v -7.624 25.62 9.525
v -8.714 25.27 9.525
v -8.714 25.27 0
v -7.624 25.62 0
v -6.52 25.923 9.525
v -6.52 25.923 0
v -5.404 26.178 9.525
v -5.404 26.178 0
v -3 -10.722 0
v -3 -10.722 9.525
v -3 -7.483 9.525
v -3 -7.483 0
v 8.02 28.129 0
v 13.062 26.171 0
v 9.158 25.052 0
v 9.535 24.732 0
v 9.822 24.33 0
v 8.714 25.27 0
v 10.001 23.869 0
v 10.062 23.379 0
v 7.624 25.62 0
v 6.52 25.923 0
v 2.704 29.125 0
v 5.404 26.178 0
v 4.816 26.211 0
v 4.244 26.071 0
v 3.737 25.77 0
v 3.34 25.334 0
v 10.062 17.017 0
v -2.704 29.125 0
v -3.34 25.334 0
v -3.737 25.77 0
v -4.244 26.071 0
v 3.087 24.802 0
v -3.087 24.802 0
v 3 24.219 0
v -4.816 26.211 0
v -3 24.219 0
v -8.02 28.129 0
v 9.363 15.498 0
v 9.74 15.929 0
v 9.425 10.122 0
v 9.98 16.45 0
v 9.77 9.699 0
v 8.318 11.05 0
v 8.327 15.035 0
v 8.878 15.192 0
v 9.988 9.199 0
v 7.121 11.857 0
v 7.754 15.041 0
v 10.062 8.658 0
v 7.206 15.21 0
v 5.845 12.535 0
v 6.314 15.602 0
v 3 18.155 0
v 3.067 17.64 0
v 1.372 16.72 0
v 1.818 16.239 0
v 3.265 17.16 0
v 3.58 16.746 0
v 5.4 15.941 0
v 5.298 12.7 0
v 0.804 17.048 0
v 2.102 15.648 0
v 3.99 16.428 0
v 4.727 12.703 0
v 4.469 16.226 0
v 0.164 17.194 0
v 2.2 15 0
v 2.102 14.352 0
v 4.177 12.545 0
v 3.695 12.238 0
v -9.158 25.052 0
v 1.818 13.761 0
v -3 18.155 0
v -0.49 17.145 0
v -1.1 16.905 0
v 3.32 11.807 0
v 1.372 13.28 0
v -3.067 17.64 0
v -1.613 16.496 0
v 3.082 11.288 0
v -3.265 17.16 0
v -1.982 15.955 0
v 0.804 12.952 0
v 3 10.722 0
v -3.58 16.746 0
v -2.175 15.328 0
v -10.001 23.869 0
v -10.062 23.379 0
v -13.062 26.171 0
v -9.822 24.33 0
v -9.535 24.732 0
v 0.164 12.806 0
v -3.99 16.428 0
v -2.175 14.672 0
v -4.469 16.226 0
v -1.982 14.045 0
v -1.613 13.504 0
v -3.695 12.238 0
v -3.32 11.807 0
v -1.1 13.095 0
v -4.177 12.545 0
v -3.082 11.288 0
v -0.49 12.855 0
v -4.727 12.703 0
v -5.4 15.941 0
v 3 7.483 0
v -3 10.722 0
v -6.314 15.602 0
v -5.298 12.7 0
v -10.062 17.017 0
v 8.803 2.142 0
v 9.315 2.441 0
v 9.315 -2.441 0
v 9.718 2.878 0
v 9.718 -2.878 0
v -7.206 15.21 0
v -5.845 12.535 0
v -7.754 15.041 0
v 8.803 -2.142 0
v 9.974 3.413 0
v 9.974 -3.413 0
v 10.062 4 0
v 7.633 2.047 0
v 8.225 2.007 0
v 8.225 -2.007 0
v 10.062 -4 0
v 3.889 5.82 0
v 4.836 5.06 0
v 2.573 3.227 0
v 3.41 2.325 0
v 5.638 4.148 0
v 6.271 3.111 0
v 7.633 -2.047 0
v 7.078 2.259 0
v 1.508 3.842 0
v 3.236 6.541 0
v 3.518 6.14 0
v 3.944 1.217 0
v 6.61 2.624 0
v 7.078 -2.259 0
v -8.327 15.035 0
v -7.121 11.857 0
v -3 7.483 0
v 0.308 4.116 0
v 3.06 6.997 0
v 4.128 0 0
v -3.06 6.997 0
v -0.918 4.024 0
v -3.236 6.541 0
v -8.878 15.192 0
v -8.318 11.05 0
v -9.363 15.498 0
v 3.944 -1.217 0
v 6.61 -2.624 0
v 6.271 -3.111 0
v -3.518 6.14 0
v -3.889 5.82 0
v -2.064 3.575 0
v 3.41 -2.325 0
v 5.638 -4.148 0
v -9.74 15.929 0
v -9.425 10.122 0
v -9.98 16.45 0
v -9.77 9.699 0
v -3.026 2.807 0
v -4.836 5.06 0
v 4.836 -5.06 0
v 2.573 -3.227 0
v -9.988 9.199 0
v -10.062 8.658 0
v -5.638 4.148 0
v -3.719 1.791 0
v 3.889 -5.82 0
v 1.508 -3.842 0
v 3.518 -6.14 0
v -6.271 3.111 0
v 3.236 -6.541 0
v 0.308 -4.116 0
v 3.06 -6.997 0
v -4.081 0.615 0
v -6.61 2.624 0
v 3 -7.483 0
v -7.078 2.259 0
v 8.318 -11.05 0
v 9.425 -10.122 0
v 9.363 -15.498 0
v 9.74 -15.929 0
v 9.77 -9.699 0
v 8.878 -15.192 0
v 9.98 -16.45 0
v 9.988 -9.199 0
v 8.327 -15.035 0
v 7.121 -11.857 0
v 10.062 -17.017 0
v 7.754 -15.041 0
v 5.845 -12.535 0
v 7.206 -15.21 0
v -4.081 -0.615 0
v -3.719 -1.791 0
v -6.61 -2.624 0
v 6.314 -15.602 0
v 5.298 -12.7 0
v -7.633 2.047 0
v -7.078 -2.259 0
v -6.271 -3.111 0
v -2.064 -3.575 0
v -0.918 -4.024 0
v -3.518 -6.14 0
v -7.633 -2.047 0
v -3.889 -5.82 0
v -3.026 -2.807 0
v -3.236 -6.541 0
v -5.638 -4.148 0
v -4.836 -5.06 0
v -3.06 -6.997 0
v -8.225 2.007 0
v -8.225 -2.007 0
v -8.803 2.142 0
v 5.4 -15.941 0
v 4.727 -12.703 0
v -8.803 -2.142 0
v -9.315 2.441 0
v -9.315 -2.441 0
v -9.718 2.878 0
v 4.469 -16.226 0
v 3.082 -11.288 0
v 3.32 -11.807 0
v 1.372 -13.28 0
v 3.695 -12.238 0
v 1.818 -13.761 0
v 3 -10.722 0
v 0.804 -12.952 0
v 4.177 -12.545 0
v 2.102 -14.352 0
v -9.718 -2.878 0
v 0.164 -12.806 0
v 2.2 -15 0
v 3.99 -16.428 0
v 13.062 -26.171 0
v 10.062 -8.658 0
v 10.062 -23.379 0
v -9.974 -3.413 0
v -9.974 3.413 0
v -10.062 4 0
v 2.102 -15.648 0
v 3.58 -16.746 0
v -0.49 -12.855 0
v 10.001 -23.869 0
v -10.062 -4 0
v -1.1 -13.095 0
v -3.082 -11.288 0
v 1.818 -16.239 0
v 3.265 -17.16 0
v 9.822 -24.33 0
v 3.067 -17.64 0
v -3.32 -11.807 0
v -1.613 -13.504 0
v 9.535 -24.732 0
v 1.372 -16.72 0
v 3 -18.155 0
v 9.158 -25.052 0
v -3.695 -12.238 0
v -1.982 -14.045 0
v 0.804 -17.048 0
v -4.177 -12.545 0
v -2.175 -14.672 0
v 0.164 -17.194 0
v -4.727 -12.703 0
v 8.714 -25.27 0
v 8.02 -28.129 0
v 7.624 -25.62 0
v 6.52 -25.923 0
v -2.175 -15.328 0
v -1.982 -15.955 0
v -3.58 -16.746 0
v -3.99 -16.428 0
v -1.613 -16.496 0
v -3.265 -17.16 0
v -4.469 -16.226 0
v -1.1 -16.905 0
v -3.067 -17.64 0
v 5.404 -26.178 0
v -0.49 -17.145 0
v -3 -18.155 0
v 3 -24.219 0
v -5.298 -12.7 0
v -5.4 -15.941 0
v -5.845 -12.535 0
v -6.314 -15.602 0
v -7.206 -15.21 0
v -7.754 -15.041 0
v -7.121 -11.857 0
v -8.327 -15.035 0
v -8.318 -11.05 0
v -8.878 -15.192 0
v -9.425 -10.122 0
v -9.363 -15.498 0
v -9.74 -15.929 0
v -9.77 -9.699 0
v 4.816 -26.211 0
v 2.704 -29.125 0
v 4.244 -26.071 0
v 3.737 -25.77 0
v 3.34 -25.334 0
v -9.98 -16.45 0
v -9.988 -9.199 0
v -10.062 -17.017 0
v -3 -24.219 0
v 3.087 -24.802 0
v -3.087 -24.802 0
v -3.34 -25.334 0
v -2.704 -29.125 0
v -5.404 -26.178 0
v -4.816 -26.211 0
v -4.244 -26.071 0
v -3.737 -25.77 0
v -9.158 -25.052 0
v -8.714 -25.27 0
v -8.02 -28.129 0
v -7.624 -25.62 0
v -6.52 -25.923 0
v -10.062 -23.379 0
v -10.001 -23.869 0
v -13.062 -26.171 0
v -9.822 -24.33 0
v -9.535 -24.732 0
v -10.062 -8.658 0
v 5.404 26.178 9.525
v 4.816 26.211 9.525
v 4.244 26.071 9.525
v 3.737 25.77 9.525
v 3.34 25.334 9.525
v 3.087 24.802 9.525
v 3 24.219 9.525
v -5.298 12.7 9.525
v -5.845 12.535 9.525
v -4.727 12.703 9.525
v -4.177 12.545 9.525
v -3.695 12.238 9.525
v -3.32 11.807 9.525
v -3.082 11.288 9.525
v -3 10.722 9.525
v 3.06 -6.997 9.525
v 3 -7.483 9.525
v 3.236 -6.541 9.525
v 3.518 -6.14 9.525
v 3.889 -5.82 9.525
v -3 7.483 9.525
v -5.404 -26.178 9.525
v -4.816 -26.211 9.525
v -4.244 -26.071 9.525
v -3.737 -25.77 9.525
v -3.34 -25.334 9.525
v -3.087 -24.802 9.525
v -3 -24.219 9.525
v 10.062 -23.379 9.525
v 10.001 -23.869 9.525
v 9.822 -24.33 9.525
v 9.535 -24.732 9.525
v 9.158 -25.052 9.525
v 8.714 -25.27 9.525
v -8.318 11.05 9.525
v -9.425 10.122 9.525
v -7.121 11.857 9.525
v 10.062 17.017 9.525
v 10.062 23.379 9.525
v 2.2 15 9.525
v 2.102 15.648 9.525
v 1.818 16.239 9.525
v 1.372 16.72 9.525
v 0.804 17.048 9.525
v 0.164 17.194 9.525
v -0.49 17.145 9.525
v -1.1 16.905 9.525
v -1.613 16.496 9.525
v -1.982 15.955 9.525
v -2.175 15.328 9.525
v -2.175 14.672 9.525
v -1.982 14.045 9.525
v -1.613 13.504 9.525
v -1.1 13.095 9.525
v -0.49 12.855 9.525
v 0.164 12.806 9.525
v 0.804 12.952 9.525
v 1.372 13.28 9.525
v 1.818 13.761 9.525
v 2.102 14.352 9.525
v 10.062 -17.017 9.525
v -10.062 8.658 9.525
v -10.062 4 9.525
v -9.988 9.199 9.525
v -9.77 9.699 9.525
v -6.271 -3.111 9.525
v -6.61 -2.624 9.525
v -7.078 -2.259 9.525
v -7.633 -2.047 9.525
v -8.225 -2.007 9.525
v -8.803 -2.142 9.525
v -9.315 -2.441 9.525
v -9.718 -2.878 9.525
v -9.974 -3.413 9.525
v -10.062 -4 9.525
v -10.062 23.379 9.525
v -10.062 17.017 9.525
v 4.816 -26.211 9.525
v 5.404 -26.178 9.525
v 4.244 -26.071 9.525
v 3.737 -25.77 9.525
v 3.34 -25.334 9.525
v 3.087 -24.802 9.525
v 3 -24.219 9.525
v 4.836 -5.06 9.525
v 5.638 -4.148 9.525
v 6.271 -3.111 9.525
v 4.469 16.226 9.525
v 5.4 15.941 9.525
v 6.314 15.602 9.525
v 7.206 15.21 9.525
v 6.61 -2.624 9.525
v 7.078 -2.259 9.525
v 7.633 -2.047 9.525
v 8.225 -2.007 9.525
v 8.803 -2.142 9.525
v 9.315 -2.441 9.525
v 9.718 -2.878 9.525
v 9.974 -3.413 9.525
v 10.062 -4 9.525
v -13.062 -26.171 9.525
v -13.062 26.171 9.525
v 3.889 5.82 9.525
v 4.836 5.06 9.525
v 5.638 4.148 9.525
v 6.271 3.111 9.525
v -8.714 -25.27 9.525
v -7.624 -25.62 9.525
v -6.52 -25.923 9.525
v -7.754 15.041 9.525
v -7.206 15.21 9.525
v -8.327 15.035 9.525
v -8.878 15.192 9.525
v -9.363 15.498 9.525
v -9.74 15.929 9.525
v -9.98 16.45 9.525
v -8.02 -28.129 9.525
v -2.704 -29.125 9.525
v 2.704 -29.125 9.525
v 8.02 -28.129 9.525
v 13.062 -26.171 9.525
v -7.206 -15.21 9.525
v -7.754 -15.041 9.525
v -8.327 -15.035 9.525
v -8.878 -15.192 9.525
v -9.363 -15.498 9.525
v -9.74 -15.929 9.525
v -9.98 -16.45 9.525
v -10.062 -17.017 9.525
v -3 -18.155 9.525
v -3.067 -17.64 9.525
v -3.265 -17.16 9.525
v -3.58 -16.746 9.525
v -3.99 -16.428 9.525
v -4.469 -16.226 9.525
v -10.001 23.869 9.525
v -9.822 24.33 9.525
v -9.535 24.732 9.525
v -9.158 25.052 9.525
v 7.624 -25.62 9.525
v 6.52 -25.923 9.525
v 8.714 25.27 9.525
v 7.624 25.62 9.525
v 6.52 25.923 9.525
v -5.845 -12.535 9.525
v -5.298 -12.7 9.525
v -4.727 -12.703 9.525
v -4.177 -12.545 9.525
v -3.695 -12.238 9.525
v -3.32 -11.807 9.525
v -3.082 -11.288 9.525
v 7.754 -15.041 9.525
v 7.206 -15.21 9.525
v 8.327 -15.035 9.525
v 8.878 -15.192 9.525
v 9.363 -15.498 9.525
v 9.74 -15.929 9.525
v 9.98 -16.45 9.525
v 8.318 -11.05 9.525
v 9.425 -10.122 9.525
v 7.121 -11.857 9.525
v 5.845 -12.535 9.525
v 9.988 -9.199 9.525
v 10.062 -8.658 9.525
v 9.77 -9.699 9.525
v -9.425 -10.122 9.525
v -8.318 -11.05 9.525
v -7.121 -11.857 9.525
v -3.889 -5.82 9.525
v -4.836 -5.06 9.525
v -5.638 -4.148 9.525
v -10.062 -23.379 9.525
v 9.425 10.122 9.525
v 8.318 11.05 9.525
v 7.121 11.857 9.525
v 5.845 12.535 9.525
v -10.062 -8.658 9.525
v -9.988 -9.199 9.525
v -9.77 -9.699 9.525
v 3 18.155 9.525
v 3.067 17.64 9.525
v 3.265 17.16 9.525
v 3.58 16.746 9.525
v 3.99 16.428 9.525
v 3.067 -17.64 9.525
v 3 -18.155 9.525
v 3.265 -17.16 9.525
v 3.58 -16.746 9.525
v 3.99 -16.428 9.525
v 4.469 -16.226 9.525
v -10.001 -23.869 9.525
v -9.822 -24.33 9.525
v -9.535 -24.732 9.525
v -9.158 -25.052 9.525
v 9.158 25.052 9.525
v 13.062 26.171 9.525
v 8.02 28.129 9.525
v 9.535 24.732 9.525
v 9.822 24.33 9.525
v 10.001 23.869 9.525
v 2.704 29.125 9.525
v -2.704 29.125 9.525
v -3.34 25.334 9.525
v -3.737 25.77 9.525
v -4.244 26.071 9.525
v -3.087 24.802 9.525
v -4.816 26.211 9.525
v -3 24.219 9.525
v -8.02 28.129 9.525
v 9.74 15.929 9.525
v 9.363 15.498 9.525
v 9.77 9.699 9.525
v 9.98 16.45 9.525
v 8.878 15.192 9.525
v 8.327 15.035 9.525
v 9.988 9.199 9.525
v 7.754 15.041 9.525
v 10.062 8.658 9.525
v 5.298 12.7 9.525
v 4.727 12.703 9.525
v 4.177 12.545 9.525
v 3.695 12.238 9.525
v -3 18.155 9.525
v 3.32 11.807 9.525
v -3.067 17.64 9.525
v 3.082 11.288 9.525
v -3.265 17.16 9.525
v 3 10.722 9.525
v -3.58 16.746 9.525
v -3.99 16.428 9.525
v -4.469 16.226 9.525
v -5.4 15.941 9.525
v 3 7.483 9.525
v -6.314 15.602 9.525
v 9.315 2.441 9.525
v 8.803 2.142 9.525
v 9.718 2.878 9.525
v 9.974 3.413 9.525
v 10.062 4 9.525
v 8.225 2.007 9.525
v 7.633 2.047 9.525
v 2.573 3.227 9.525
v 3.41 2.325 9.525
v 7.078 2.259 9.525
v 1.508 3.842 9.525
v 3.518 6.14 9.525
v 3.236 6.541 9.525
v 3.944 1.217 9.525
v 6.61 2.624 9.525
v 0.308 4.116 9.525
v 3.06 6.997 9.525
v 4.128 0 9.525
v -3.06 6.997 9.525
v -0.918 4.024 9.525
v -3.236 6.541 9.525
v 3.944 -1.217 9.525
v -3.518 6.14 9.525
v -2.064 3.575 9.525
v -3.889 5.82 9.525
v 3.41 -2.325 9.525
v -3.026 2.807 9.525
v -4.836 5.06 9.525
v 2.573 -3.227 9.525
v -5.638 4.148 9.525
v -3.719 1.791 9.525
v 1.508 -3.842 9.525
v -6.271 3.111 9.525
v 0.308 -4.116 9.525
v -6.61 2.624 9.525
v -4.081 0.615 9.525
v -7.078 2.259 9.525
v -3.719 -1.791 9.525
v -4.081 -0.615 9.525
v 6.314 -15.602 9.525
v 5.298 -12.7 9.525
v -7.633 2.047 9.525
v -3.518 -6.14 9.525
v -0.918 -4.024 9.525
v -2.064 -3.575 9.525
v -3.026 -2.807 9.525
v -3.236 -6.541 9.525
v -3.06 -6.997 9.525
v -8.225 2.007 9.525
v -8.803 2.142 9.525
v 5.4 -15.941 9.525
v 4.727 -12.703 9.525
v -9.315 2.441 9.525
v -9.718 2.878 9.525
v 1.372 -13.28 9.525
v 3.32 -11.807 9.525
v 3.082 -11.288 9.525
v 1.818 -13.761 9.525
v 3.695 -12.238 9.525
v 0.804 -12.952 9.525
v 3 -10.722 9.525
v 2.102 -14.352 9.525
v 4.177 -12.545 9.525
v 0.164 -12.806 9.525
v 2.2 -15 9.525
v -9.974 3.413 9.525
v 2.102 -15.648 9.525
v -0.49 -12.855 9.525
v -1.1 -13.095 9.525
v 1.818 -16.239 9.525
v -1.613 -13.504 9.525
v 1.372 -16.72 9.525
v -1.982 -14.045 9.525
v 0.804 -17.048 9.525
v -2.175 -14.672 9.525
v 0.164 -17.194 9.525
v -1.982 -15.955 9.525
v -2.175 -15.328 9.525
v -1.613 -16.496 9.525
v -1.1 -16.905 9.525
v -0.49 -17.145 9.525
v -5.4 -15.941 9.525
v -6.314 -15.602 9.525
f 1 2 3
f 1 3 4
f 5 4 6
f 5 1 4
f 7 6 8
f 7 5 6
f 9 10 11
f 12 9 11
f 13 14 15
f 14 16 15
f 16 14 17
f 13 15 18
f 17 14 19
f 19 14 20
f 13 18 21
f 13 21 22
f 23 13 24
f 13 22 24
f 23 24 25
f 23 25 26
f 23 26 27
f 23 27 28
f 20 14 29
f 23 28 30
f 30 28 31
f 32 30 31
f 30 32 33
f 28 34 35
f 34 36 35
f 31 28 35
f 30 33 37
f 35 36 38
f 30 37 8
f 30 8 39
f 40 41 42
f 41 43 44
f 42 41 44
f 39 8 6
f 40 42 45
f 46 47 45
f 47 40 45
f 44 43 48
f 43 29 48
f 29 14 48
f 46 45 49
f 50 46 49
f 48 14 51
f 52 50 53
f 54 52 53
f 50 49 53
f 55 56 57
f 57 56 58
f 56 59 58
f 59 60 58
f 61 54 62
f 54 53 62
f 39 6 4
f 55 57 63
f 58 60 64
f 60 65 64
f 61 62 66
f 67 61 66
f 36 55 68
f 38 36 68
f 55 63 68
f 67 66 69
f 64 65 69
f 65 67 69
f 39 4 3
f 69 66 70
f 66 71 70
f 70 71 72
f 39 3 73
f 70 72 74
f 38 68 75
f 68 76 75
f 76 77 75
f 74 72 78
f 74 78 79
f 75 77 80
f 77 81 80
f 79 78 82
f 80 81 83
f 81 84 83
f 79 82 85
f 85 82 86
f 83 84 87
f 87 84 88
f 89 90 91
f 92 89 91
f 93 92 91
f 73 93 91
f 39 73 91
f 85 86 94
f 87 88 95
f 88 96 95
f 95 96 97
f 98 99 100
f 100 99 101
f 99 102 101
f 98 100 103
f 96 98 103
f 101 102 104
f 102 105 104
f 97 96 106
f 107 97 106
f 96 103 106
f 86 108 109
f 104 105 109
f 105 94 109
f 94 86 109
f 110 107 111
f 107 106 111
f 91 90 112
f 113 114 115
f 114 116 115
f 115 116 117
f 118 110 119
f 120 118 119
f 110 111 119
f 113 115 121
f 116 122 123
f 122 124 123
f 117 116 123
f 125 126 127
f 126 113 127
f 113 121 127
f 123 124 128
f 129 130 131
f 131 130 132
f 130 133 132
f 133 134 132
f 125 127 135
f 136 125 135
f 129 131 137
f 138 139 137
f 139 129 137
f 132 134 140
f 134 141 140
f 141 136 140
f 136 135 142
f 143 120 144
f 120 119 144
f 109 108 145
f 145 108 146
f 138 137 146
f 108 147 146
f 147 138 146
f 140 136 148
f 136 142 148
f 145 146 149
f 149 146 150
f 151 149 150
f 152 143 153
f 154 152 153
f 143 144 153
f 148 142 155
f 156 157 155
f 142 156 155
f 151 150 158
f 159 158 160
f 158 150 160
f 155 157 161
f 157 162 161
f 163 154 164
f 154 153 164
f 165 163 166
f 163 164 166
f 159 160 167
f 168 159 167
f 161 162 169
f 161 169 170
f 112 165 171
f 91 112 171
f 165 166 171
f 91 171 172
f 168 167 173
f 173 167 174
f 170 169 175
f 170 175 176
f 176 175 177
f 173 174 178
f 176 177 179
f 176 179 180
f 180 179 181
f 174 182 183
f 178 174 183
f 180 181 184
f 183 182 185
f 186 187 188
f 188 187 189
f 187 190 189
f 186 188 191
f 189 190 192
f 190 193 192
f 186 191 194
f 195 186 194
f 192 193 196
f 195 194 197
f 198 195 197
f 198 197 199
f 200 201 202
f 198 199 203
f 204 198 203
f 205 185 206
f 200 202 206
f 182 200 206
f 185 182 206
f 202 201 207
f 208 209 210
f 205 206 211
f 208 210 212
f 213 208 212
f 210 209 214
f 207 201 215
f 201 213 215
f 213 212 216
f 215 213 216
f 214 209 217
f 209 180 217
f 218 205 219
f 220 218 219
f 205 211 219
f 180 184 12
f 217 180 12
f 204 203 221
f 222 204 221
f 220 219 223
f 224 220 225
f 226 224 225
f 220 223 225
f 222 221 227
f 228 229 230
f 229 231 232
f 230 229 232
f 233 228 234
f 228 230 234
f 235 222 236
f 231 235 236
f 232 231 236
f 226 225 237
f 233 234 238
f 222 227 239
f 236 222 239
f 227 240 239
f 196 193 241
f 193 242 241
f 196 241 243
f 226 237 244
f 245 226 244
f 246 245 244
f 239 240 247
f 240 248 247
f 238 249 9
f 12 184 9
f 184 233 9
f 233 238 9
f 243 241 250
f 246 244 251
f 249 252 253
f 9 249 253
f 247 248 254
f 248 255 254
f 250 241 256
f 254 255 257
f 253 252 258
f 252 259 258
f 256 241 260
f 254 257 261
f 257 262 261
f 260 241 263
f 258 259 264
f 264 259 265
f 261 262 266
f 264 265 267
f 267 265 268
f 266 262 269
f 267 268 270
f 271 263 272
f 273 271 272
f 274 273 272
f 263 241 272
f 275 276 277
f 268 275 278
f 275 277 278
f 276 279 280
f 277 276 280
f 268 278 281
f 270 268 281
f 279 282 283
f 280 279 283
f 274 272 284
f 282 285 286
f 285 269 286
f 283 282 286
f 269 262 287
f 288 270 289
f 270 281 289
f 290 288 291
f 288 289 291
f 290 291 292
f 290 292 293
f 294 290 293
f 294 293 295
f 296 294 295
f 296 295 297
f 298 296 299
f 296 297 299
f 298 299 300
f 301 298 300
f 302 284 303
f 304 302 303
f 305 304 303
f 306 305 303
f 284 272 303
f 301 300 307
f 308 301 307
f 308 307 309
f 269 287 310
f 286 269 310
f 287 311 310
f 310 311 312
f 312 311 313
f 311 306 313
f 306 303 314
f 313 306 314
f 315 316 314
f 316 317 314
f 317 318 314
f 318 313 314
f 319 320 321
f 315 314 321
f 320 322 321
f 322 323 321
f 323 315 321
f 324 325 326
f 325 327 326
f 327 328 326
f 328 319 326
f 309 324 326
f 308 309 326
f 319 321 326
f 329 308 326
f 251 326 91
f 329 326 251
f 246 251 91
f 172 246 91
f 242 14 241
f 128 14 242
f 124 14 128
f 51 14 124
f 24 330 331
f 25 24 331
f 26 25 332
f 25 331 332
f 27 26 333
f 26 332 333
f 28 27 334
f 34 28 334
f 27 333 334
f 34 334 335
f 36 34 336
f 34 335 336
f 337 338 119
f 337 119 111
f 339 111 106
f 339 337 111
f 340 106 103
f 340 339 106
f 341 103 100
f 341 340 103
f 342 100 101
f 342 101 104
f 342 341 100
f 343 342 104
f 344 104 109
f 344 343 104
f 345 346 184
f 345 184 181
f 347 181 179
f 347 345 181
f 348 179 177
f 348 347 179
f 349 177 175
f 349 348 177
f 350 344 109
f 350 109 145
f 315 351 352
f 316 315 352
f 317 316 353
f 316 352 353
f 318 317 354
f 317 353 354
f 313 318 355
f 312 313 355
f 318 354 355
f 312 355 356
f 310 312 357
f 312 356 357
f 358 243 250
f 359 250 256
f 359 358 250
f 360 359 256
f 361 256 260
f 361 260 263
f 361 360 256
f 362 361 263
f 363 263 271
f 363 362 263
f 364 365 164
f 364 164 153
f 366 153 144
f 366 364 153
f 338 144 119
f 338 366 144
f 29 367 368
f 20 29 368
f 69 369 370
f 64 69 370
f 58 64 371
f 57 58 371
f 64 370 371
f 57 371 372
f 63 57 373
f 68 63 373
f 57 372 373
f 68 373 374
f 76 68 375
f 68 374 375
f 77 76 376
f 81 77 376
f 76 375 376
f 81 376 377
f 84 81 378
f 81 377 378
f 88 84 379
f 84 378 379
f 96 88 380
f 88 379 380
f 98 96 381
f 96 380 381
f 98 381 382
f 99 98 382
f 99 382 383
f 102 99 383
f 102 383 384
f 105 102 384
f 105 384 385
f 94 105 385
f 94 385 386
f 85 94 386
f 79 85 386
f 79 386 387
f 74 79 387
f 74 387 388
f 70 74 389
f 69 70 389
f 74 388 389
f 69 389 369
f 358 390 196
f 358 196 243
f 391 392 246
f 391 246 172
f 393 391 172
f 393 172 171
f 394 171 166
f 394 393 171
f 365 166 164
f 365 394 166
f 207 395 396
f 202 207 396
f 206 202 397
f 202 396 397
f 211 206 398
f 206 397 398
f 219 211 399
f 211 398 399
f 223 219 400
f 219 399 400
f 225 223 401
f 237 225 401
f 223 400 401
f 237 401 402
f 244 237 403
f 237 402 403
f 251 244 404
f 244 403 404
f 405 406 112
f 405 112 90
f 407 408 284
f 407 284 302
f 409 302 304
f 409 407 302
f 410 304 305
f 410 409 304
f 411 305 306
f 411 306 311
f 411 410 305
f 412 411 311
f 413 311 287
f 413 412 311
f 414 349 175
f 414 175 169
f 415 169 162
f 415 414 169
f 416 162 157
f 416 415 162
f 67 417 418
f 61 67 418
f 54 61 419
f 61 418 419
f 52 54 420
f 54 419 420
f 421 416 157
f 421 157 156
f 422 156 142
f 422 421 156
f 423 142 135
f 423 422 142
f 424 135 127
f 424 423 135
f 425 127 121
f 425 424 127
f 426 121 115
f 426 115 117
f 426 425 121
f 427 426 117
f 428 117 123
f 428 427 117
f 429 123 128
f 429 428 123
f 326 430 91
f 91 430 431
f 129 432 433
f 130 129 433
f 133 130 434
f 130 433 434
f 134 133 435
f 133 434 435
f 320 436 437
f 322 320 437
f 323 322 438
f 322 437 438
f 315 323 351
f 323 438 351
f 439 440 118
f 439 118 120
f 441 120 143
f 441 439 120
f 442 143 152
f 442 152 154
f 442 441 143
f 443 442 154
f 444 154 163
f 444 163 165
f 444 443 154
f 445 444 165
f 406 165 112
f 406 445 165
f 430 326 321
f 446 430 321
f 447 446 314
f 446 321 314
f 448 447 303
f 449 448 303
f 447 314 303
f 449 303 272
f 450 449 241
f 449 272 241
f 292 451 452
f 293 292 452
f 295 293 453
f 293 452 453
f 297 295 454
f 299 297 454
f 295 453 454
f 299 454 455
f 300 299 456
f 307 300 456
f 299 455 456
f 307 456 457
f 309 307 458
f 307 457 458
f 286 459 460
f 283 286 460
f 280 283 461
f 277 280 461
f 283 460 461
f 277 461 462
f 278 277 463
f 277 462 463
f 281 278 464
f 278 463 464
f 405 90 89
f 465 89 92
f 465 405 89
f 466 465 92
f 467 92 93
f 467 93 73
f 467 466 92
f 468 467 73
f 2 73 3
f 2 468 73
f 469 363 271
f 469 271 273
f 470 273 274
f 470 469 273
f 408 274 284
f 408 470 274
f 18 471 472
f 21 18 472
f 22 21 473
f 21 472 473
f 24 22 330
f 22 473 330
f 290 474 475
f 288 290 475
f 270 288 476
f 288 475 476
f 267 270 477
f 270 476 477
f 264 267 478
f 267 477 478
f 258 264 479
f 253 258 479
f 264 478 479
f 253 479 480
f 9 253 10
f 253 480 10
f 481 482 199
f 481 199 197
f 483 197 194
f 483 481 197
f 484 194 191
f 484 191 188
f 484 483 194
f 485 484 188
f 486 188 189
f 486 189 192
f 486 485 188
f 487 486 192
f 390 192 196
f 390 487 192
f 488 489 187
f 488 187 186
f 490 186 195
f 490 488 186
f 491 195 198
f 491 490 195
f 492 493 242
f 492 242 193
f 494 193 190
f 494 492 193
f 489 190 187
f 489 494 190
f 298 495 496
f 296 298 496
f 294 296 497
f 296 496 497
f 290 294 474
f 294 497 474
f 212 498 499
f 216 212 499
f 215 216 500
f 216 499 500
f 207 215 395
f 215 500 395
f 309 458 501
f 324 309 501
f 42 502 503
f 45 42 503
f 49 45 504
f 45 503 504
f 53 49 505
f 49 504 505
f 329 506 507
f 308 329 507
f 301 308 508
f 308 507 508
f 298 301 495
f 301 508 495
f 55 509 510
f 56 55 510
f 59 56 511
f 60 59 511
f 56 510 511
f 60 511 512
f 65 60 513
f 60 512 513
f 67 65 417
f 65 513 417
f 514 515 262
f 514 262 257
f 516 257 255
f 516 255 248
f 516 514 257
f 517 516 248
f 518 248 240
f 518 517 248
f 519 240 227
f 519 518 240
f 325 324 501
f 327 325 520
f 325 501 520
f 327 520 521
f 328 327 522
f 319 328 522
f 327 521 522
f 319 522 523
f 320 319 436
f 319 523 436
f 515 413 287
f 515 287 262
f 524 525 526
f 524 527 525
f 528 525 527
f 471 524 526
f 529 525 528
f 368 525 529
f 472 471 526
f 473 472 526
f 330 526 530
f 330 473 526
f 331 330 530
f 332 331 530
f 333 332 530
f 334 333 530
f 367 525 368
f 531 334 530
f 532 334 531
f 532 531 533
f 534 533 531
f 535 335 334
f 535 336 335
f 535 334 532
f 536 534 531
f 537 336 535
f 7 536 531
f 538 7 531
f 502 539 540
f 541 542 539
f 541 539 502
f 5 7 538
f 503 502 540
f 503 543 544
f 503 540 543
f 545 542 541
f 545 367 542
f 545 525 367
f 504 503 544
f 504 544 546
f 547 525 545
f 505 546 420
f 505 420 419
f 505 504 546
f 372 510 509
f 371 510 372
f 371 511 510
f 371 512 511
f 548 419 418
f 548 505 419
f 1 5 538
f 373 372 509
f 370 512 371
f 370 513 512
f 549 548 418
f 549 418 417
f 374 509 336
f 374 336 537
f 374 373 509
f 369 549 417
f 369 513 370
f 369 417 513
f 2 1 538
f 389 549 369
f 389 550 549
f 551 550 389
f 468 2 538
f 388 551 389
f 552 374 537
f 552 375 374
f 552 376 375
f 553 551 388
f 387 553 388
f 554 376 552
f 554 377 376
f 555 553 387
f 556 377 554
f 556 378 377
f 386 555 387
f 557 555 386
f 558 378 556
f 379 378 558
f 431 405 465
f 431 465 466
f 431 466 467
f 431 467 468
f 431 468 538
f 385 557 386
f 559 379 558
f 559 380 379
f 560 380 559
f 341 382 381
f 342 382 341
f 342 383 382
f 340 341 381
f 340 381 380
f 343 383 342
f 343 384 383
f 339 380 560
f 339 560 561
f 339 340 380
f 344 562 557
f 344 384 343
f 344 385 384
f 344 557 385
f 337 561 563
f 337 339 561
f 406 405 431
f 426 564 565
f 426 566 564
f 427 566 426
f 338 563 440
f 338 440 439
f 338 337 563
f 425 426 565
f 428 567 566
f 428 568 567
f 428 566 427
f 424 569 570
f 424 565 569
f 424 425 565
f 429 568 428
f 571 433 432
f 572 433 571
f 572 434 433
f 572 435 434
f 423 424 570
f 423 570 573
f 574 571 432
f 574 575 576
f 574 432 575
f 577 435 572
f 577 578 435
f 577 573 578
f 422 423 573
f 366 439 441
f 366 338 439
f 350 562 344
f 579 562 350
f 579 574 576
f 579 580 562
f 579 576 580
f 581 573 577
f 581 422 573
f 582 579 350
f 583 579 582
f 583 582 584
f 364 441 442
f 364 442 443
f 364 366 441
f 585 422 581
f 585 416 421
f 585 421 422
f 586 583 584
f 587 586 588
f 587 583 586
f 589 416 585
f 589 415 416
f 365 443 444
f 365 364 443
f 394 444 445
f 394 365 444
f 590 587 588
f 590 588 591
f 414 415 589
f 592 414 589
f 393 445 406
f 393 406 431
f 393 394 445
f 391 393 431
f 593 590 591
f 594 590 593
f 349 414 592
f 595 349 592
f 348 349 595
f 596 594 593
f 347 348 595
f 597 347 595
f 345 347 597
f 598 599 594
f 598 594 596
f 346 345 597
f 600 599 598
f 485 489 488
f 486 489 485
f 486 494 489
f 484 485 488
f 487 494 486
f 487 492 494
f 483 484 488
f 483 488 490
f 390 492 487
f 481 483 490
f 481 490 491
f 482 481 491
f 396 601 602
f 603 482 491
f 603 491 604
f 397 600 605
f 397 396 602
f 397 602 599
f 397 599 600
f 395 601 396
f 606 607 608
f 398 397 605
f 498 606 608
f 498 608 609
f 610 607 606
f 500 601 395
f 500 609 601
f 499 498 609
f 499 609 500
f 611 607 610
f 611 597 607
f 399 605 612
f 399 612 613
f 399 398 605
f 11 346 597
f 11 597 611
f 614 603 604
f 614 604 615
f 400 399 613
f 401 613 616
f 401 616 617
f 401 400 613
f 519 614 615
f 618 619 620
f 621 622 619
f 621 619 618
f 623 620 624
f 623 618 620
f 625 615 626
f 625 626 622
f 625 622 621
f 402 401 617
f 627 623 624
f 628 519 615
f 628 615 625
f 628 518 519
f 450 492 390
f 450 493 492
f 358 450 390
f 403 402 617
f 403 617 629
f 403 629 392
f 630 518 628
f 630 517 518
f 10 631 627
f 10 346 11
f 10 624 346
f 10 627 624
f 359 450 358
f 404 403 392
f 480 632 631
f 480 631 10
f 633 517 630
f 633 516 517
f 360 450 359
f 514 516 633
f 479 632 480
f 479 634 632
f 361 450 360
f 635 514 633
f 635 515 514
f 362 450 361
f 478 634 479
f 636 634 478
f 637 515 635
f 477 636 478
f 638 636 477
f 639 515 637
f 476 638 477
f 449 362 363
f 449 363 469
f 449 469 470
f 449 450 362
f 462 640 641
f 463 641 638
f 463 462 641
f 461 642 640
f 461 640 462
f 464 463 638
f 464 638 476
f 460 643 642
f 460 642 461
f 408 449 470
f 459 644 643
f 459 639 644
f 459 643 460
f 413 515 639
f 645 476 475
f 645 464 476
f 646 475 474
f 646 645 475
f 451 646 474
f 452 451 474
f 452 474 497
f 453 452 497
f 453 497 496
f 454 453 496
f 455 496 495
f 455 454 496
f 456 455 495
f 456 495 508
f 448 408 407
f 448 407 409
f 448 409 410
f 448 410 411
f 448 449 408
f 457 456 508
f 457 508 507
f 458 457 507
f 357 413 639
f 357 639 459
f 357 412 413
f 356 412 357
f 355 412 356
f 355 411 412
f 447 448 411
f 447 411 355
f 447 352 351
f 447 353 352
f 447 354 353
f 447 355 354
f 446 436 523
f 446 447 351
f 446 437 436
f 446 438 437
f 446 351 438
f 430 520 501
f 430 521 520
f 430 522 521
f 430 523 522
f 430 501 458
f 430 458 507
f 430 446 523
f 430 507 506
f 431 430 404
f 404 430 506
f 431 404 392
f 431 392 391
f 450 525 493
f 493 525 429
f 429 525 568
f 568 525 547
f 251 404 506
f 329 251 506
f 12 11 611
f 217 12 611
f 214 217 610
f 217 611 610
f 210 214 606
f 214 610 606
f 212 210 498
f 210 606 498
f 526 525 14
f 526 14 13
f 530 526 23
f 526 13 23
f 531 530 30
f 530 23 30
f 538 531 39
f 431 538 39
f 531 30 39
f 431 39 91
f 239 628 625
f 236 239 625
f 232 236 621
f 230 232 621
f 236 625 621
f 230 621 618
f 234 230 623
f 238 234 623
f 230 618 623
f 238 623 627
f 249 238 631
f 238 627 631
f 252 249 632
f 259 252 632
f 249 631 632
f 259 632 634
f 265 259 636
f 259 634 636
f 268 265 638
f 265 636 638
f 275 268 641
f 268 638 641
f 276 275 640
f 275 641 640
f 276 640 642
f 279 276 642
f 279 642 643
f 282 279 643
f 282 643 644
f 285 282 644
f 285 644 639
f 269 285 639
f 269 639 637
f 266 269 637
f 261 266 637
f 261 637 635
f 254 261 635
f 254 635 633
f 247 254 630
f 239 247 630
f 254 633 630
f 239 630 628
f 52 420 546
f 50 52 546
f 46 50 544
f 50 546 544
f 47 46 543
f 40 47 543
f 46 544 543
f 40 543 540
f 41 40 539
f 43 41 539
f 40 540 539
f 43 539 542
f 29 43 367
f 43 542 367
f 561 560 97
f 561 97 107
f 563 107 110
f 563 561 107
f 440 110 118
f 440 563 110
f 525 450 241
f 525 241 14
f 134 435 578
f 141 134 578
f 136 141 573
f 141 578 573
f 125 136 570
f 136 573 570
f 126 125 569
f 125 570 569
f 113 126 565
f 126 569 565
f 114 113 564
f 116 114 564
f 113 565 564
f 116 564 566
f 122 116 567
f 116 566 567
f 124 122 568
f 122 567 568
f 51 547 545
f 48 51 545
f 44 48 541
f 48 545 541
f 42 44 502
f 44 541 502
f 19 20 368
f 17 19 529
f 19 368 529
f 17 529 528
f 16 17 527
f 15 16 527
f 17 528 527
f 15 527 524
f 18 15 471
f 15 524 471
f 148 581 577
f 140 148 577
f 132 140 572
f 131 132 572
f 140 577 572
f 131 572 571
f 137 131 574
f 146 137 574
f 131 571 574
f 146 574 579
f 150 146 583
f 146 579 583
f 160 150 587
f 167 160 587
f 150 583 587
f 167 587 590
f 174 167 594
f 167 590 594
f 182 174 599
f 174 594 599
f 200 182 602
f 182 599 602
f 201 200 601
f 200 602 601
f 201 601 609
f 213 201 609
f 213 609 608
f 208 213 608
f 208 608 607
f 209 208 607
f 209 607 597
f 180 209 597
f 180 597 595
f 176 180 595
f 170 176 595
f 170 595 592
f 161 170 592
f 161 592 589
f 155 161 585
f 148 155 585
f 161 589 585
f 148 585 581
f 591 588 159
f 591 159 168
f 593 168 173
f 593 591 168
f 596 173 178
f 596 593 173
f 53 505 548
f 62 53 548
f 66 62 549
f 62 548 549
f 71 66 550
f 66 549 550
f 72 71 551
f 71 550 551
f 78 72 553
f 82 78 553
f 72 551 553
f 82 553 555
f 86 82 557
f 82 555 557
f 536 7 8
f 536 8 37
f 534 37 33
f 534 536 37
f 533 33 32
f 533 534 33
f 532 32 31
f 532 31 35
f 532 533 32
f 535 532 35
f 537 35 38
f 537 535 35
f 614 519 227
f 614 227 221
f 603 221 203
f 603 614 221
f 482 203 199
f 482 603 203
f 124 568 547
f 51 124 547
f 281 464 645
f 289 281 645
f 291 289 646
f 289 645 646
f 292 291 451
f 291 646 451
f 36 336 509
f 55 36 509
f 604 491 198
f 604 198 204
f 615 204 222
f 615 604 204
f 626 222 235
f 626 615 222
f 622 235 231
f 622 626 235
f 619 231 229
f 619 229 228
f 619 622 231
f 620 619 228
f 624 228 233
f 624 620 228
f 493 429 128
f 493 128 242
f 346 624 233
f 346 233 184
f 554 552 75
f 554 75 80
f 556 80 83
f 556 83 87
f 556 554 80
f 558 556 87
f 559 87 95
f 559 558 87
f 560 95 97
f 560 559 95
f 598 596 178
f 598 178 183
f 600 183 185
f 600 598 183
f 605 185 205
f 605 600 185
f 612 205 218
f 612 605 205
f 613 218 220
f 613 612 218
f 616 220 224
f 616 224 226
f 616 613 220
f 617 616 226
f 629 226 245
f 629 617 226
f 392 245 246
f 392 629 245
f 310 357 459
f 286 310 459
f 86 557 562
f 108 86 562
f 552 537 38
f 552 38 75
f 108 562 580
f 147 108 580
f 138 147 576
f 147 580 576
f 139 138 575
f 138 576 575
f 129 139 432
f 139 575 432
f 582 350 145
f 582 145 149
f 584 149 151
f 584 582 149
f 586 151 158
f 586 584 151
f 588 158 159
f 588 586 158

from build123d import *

# Parameters (mm, degrees)
SKETCH1_R            = 29.25
EXTRUDE_3_8_DEPTH    = 9.525
CUT_EXTRUDE1_DEPTH   = 9.525
SKETCH3_R            = 2.2
M4_THROUGH_DEPTH     = 9.525
SKETCH4_R            = 4.1275
F_3_8_16_DRILL_DEPTH = 9.525
SKETCH6_W            = 18.02935576
SKETCH6_H            = 57.579918791
CUT_EXTRUDE2_DEPTH   = 9.525


with BuildPart() as part:
    # Sketch1 → 3/8 (new body)
    with BuildSketch(Plane.XY):
        with Locations(Location((0, 0, 0), (0, 0, 180))):
            Circle(SKETCH1_R)
    extrude(amount=EXTRUDE_3_8_DEPTH)

    # Sketch2 → Cut-Extrude1 (cut)
    with BuildSketch(Plane.XY.offset(9.525)):
        with BuildLine():
            Line((-3, 24.219267124), (-3, 18.154700472))
            ThreePointArc((-3, 18.154700472), (-3.409072822, 16.942697702), (-4.468950714, 16.226492325))
            ThreePointArc((-4.468950714, 16.226492325), (-5.859541661, 15.777716729), (-7.205966503, 15.210017108))
            ThreePointArc((-7.205966503, 15.210017108), (-9.131700947, 15.327380042), (-10.062257748, 17.017436623))
            Line((-10.062257748, 17.017436623), (-10.062257748, 23.378898605))
            ThreePointArc((-10.062257748, 23.378898605), (-9.690760884, 24.539922954), (-8.714280211, 25.269630397))
            ThreePointArc((-8.714280211, 25.269630397), (-7.073918129, 25.776977757), (-5.404367165, 26.177962402))
            ThreePointArc((-5.404367165, 26.177962402), (-3.736816389, 25.769869318), (-3, 24.219267124))
        make_face()
        with BuildLine():
            Line((-3, 10.72213294), (-3, 7.483314774))
            ThreePointArc((-3, 7.483314774), (-3.236165793, 6.540505732), (-3.888888889, 5.820355935))
            ThreePointArc((-3.888888889, 5.820355935), (-5.257283867, 4.621792546), (-6.270644915, 3.111111111))
            ThreePointArc((-6.270644915, 3.111111111), (-8.518752181, 2.052793582), (-10.062257748, 4))
            Line((-10.062257748, 4), (-10.062257748, 8.658183111))
            ThreePointArc((-10.062257748, 8.658183111), (-9.896091132, 9.45634044), (-9.425202627, 10.121870666))
            ThreePointArc((-9.425202627, 10.121870666), (-7.729958395, 11.468847089), (-5.845262531, 12.534736386))
            ThreePointArc((-5.845262531, 12.534736386), (-3.925412885, 12.408923541), (-3, 10.72213294))
        make_face()
        with BuildLine():
            Line((3, 10.72213294), (3, 7.483314774))
            ThreePointArc((3, 7.483314774), (3.236165793, 6.540505732), (3.888888889, 5.820355935))
            ThreePointArc((3.888888889, 5.820355935), (5.257283867, 4.621792546), (6.270644915, 3.111111111))
            ThreePointArc((6.270644915, 3.111111111), (8.518752181, 2.052793582), (10.062257748, 4))
            Line((10.062257748, 4), (10.062257748, 8.658183111))
            ThreePointArc((10.062257748, 8.658183111), (9.896091132, 9.45634044), (9.425202627, 10.121870666))
            ThreePointArc((9.425202627, 10.121870666), (7.729958395, 11.468847089), (5.845262531, 12.534736386))
            ThreePointArc((5.845262531, 12.534736386), (3.925412885, 12.408923541), (3, 10.72213294))
        make_face()
        with BuildLine():
            Line((3, 24.219267124), (3, 18.154700472))
            ThreePointArc((3, 18.154700472), (3.409072822, 16.942697702), (4.468950714, 16.226492325))
            ThreePointArc((4.468950714, 16.226492325), (5.859541661, 15.777716729), (7.205966503, 15.210017108))
            ThreePointArc((7.205966503, 15.210017108), (9.131700947, 15.327380042), (10.062257748, 17.017436623))
            Line((10.062257748, 17.017436623), (10.062257748, 23.378898605))
            ThreePointArc((10.062257748, 23.378898605), (9.690760884, 24.539922954), (8.714280211, 25.269630397))
            ThreePointArc((8.714280211, 25.269630397), (7.073918129, 25.776977757), (5.404367165, 26.177962402))
            ThreePointArc((5.404367165, 26.177962402), (3.736816389, 25.769869318), (3, 24.219267124))
        make_face()
        with BuildLine():
            Line((-3, -10.72213294), (-3, -7.483314774))
            ThreePointArc((-3, -7.483314774), (-3.236165793, -6.540505732), (-3.888888889, -5.820355935))
            ThreePointArc((-3.888888889, -5.820355935), (-5.257283867, -4.621792546), (-6.270644915, -3.111111111))
            ThreePointArc((-6.270644915, -3.111111111), (-8.518752181, -2.052793582), (-10.062257748, -4))
            Line((-10.062257748, -4), (-10.062257748, -8.658183111))
            ThreePointArc((-10.062257748, -8.658183111), (-9.896091132, -9.45634044), (-9.425202627, -10.121870666))
            ThreePointArc((-9.425202627, -10.121870666), (-7.729958395, -11.468847089), (-5.845262531, -12.534736386))
            ThreePointArc((-5.845262531, -12.534736386), (-3.925412885, -12.408923541), (-3, -10.72213294))
        make_face()
        with BuildLine():
            Line((3, -10.72213294), (3, -7.483314774))
            ThreePointArc((3, -7.483314774), (3.236165793, -6.540505732), (3.888888889, -5.820355935))
            ThreePointArc((3.888888889, -5.820355935), (5.257283867, -4.621792546), (6.270644915, -3.111111111))
            ThreePointArc((6.270644915, -3.111111111), (8.518752181, -2.052793582), (10.062257748, -4))
            Line((10.062257748, -4), (10.062257748, -8.658183111))
            ThreePointArc((10.062257748, -8.658183111), (9.896091132, -9.45634044), (9.425202627, -10.121870666))
            ThreePointArc((9.425202627, -10.121870666), (7.729958395, -11.468847089), (5.845262531, -12.534736386))
            ThreePointArc((5.845262531, -12.534736386), (3.925412885, -12.408923541), (3, -10.72213294))
        make_face()
        with BuildLine():
            Line((3, -24.219267124), (3, -18.154700472))
            ThreePointArc((3, -18.154700472), (3.409072822, -16.942697702), (4.468950714, -16.226492325))
            ThreePointArc((4.468950714, -16.226492325), (5.859541661, -15.777716729), (7.205966503, -15.210017108))
            ThreePointArc((7.205966503, -15.210017108), (9.131700947, -15.327380042), (10.062257748, -17.017436623))
            Line((10.062257748, -17.017436623), (10.062257748, -23.378898605))
            ThreePointArc((10.062257748, -23.378898605), (9.690760884, -24.539922954), (8.714280211, -25.269630397))
            ThreePointArc((8.714280211, -25.269630397), (7.073918129, -25.776977757), (5.404367165, -26.177962402))
            ThreePointArc((5.404367165, -26.177962402), (3.736816389, -25.769869318), (3, -24.219267124))
        make_face()
        with BuildLine():
            Line((-3, -24.219267124), (-3, -18.154700472))
            ThreePointArc((-3, -18.154700472), (-3.409072822, -16.942697702), (-4.468950714, -16.226492325))
            ThreePointArc((-4.468950714, -16.226492325), (-5.859541661, -15.777716729), (-7.205966503, -15.210017108))
            ThreePointArc((-7.205966503, -15.210017108), (-9.131700947, -15.327380042), (-10.062257748, -17.017436623))
            Line((-10.062257748, -17.017436623), (-10.062257748, -23.378898605))
            ThreePointArc((-10.062257748, -23.378898605), (-9.690760884, -24.539922954), (-8.714280211, -25.269630397))
            ThreePointArc((-8.714280211, -25.269630397), (-7.073918129, -25.776977757), (-5.404367165, -26.177962402))
            ThreePointArc((-5.404367165, -26.177962402), (-3.736816389, -25.769869318), (-3, -24.219267124))
        make_face()
    extrude(amount=-CUT_EXTRUDE1_DEPTH, mode=Mode.SUBTRACT)

    # Sketch3 → M4_through (cut)
    with BuildSketch(Plane.XY.offset(9.525)):
        with Locations((0, 15)):
            Circle(SKETCH3_R)
        with Locations((0, -15)):
            Circle(SKETCH3_R)
    extrude(amount=-M4_THROUGH_DEPTH, mode=Mode.SUBTRACT)

    # Sketch4 → 3/8_-16-DRILL (cut)
    with BuildSketch(Plane.XY.offset(9.525)):
        Circle(SKETCH4_R)
    extrude(amount=-F_3_8_16_DRILL_DEPTH, mode=Mode.SUBTRACT)

    # Sketch6 → Cut-Extrude2 (cut)
    with BuildSketch(Plane.XY.offset(9.525)):
        with Locations((-22.076935628, -1.336167669)):
            Rectangle(SKETCH6_W, SKETCH6_H)
        with Locations((22.076935628, -1.336167669)):
            Rectangle(SKETCH6_W, SKETCH6_H)
    extrude(amount=-CUT_EXTRUDE2_DEPTH, mode=Mode.SUBTRACT)


solid = part.part
